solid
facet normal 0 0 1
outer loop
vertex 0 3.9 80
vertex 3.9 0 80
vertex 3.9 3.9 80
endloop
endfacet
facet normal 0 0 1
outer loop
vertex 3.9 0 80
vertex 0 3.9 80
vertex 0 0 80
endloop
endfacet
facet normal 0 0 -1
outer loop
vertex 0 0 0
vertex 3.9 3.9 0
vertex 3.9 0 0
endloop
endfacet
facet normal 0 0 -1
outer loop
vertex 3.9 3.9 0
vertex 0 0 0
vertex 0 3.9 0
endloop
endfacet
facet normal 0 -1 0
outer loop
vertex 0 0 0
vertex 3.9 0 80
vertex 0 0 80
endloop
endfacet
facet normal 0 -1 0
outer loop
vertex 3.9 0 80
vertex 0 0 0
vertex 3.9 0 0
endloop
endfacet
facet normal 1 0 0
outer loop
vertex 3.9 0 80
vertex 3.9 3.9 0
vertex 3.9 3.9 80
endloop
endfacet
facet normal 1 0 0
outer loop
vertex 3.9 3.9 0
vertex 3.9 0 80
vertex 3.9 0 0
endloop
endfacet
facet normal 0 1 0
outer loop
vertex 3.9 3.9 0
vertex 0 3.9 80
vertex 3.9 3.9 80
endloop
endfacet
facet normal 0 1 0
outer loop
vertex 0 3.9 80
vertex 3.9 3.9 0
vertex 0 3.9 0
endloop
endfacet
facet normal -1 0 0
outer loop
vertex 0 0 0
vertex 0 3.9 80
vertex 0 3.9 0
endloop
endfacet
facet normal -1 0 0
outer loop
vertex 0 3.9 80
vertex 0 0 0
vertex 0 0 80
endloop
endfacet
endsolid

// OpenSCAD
//difference() {
//translate([-0.5, -0.5, 0]) cube([5.2, 5.2, 20]);
cube([3.9, 3.9, 80]);
//}
